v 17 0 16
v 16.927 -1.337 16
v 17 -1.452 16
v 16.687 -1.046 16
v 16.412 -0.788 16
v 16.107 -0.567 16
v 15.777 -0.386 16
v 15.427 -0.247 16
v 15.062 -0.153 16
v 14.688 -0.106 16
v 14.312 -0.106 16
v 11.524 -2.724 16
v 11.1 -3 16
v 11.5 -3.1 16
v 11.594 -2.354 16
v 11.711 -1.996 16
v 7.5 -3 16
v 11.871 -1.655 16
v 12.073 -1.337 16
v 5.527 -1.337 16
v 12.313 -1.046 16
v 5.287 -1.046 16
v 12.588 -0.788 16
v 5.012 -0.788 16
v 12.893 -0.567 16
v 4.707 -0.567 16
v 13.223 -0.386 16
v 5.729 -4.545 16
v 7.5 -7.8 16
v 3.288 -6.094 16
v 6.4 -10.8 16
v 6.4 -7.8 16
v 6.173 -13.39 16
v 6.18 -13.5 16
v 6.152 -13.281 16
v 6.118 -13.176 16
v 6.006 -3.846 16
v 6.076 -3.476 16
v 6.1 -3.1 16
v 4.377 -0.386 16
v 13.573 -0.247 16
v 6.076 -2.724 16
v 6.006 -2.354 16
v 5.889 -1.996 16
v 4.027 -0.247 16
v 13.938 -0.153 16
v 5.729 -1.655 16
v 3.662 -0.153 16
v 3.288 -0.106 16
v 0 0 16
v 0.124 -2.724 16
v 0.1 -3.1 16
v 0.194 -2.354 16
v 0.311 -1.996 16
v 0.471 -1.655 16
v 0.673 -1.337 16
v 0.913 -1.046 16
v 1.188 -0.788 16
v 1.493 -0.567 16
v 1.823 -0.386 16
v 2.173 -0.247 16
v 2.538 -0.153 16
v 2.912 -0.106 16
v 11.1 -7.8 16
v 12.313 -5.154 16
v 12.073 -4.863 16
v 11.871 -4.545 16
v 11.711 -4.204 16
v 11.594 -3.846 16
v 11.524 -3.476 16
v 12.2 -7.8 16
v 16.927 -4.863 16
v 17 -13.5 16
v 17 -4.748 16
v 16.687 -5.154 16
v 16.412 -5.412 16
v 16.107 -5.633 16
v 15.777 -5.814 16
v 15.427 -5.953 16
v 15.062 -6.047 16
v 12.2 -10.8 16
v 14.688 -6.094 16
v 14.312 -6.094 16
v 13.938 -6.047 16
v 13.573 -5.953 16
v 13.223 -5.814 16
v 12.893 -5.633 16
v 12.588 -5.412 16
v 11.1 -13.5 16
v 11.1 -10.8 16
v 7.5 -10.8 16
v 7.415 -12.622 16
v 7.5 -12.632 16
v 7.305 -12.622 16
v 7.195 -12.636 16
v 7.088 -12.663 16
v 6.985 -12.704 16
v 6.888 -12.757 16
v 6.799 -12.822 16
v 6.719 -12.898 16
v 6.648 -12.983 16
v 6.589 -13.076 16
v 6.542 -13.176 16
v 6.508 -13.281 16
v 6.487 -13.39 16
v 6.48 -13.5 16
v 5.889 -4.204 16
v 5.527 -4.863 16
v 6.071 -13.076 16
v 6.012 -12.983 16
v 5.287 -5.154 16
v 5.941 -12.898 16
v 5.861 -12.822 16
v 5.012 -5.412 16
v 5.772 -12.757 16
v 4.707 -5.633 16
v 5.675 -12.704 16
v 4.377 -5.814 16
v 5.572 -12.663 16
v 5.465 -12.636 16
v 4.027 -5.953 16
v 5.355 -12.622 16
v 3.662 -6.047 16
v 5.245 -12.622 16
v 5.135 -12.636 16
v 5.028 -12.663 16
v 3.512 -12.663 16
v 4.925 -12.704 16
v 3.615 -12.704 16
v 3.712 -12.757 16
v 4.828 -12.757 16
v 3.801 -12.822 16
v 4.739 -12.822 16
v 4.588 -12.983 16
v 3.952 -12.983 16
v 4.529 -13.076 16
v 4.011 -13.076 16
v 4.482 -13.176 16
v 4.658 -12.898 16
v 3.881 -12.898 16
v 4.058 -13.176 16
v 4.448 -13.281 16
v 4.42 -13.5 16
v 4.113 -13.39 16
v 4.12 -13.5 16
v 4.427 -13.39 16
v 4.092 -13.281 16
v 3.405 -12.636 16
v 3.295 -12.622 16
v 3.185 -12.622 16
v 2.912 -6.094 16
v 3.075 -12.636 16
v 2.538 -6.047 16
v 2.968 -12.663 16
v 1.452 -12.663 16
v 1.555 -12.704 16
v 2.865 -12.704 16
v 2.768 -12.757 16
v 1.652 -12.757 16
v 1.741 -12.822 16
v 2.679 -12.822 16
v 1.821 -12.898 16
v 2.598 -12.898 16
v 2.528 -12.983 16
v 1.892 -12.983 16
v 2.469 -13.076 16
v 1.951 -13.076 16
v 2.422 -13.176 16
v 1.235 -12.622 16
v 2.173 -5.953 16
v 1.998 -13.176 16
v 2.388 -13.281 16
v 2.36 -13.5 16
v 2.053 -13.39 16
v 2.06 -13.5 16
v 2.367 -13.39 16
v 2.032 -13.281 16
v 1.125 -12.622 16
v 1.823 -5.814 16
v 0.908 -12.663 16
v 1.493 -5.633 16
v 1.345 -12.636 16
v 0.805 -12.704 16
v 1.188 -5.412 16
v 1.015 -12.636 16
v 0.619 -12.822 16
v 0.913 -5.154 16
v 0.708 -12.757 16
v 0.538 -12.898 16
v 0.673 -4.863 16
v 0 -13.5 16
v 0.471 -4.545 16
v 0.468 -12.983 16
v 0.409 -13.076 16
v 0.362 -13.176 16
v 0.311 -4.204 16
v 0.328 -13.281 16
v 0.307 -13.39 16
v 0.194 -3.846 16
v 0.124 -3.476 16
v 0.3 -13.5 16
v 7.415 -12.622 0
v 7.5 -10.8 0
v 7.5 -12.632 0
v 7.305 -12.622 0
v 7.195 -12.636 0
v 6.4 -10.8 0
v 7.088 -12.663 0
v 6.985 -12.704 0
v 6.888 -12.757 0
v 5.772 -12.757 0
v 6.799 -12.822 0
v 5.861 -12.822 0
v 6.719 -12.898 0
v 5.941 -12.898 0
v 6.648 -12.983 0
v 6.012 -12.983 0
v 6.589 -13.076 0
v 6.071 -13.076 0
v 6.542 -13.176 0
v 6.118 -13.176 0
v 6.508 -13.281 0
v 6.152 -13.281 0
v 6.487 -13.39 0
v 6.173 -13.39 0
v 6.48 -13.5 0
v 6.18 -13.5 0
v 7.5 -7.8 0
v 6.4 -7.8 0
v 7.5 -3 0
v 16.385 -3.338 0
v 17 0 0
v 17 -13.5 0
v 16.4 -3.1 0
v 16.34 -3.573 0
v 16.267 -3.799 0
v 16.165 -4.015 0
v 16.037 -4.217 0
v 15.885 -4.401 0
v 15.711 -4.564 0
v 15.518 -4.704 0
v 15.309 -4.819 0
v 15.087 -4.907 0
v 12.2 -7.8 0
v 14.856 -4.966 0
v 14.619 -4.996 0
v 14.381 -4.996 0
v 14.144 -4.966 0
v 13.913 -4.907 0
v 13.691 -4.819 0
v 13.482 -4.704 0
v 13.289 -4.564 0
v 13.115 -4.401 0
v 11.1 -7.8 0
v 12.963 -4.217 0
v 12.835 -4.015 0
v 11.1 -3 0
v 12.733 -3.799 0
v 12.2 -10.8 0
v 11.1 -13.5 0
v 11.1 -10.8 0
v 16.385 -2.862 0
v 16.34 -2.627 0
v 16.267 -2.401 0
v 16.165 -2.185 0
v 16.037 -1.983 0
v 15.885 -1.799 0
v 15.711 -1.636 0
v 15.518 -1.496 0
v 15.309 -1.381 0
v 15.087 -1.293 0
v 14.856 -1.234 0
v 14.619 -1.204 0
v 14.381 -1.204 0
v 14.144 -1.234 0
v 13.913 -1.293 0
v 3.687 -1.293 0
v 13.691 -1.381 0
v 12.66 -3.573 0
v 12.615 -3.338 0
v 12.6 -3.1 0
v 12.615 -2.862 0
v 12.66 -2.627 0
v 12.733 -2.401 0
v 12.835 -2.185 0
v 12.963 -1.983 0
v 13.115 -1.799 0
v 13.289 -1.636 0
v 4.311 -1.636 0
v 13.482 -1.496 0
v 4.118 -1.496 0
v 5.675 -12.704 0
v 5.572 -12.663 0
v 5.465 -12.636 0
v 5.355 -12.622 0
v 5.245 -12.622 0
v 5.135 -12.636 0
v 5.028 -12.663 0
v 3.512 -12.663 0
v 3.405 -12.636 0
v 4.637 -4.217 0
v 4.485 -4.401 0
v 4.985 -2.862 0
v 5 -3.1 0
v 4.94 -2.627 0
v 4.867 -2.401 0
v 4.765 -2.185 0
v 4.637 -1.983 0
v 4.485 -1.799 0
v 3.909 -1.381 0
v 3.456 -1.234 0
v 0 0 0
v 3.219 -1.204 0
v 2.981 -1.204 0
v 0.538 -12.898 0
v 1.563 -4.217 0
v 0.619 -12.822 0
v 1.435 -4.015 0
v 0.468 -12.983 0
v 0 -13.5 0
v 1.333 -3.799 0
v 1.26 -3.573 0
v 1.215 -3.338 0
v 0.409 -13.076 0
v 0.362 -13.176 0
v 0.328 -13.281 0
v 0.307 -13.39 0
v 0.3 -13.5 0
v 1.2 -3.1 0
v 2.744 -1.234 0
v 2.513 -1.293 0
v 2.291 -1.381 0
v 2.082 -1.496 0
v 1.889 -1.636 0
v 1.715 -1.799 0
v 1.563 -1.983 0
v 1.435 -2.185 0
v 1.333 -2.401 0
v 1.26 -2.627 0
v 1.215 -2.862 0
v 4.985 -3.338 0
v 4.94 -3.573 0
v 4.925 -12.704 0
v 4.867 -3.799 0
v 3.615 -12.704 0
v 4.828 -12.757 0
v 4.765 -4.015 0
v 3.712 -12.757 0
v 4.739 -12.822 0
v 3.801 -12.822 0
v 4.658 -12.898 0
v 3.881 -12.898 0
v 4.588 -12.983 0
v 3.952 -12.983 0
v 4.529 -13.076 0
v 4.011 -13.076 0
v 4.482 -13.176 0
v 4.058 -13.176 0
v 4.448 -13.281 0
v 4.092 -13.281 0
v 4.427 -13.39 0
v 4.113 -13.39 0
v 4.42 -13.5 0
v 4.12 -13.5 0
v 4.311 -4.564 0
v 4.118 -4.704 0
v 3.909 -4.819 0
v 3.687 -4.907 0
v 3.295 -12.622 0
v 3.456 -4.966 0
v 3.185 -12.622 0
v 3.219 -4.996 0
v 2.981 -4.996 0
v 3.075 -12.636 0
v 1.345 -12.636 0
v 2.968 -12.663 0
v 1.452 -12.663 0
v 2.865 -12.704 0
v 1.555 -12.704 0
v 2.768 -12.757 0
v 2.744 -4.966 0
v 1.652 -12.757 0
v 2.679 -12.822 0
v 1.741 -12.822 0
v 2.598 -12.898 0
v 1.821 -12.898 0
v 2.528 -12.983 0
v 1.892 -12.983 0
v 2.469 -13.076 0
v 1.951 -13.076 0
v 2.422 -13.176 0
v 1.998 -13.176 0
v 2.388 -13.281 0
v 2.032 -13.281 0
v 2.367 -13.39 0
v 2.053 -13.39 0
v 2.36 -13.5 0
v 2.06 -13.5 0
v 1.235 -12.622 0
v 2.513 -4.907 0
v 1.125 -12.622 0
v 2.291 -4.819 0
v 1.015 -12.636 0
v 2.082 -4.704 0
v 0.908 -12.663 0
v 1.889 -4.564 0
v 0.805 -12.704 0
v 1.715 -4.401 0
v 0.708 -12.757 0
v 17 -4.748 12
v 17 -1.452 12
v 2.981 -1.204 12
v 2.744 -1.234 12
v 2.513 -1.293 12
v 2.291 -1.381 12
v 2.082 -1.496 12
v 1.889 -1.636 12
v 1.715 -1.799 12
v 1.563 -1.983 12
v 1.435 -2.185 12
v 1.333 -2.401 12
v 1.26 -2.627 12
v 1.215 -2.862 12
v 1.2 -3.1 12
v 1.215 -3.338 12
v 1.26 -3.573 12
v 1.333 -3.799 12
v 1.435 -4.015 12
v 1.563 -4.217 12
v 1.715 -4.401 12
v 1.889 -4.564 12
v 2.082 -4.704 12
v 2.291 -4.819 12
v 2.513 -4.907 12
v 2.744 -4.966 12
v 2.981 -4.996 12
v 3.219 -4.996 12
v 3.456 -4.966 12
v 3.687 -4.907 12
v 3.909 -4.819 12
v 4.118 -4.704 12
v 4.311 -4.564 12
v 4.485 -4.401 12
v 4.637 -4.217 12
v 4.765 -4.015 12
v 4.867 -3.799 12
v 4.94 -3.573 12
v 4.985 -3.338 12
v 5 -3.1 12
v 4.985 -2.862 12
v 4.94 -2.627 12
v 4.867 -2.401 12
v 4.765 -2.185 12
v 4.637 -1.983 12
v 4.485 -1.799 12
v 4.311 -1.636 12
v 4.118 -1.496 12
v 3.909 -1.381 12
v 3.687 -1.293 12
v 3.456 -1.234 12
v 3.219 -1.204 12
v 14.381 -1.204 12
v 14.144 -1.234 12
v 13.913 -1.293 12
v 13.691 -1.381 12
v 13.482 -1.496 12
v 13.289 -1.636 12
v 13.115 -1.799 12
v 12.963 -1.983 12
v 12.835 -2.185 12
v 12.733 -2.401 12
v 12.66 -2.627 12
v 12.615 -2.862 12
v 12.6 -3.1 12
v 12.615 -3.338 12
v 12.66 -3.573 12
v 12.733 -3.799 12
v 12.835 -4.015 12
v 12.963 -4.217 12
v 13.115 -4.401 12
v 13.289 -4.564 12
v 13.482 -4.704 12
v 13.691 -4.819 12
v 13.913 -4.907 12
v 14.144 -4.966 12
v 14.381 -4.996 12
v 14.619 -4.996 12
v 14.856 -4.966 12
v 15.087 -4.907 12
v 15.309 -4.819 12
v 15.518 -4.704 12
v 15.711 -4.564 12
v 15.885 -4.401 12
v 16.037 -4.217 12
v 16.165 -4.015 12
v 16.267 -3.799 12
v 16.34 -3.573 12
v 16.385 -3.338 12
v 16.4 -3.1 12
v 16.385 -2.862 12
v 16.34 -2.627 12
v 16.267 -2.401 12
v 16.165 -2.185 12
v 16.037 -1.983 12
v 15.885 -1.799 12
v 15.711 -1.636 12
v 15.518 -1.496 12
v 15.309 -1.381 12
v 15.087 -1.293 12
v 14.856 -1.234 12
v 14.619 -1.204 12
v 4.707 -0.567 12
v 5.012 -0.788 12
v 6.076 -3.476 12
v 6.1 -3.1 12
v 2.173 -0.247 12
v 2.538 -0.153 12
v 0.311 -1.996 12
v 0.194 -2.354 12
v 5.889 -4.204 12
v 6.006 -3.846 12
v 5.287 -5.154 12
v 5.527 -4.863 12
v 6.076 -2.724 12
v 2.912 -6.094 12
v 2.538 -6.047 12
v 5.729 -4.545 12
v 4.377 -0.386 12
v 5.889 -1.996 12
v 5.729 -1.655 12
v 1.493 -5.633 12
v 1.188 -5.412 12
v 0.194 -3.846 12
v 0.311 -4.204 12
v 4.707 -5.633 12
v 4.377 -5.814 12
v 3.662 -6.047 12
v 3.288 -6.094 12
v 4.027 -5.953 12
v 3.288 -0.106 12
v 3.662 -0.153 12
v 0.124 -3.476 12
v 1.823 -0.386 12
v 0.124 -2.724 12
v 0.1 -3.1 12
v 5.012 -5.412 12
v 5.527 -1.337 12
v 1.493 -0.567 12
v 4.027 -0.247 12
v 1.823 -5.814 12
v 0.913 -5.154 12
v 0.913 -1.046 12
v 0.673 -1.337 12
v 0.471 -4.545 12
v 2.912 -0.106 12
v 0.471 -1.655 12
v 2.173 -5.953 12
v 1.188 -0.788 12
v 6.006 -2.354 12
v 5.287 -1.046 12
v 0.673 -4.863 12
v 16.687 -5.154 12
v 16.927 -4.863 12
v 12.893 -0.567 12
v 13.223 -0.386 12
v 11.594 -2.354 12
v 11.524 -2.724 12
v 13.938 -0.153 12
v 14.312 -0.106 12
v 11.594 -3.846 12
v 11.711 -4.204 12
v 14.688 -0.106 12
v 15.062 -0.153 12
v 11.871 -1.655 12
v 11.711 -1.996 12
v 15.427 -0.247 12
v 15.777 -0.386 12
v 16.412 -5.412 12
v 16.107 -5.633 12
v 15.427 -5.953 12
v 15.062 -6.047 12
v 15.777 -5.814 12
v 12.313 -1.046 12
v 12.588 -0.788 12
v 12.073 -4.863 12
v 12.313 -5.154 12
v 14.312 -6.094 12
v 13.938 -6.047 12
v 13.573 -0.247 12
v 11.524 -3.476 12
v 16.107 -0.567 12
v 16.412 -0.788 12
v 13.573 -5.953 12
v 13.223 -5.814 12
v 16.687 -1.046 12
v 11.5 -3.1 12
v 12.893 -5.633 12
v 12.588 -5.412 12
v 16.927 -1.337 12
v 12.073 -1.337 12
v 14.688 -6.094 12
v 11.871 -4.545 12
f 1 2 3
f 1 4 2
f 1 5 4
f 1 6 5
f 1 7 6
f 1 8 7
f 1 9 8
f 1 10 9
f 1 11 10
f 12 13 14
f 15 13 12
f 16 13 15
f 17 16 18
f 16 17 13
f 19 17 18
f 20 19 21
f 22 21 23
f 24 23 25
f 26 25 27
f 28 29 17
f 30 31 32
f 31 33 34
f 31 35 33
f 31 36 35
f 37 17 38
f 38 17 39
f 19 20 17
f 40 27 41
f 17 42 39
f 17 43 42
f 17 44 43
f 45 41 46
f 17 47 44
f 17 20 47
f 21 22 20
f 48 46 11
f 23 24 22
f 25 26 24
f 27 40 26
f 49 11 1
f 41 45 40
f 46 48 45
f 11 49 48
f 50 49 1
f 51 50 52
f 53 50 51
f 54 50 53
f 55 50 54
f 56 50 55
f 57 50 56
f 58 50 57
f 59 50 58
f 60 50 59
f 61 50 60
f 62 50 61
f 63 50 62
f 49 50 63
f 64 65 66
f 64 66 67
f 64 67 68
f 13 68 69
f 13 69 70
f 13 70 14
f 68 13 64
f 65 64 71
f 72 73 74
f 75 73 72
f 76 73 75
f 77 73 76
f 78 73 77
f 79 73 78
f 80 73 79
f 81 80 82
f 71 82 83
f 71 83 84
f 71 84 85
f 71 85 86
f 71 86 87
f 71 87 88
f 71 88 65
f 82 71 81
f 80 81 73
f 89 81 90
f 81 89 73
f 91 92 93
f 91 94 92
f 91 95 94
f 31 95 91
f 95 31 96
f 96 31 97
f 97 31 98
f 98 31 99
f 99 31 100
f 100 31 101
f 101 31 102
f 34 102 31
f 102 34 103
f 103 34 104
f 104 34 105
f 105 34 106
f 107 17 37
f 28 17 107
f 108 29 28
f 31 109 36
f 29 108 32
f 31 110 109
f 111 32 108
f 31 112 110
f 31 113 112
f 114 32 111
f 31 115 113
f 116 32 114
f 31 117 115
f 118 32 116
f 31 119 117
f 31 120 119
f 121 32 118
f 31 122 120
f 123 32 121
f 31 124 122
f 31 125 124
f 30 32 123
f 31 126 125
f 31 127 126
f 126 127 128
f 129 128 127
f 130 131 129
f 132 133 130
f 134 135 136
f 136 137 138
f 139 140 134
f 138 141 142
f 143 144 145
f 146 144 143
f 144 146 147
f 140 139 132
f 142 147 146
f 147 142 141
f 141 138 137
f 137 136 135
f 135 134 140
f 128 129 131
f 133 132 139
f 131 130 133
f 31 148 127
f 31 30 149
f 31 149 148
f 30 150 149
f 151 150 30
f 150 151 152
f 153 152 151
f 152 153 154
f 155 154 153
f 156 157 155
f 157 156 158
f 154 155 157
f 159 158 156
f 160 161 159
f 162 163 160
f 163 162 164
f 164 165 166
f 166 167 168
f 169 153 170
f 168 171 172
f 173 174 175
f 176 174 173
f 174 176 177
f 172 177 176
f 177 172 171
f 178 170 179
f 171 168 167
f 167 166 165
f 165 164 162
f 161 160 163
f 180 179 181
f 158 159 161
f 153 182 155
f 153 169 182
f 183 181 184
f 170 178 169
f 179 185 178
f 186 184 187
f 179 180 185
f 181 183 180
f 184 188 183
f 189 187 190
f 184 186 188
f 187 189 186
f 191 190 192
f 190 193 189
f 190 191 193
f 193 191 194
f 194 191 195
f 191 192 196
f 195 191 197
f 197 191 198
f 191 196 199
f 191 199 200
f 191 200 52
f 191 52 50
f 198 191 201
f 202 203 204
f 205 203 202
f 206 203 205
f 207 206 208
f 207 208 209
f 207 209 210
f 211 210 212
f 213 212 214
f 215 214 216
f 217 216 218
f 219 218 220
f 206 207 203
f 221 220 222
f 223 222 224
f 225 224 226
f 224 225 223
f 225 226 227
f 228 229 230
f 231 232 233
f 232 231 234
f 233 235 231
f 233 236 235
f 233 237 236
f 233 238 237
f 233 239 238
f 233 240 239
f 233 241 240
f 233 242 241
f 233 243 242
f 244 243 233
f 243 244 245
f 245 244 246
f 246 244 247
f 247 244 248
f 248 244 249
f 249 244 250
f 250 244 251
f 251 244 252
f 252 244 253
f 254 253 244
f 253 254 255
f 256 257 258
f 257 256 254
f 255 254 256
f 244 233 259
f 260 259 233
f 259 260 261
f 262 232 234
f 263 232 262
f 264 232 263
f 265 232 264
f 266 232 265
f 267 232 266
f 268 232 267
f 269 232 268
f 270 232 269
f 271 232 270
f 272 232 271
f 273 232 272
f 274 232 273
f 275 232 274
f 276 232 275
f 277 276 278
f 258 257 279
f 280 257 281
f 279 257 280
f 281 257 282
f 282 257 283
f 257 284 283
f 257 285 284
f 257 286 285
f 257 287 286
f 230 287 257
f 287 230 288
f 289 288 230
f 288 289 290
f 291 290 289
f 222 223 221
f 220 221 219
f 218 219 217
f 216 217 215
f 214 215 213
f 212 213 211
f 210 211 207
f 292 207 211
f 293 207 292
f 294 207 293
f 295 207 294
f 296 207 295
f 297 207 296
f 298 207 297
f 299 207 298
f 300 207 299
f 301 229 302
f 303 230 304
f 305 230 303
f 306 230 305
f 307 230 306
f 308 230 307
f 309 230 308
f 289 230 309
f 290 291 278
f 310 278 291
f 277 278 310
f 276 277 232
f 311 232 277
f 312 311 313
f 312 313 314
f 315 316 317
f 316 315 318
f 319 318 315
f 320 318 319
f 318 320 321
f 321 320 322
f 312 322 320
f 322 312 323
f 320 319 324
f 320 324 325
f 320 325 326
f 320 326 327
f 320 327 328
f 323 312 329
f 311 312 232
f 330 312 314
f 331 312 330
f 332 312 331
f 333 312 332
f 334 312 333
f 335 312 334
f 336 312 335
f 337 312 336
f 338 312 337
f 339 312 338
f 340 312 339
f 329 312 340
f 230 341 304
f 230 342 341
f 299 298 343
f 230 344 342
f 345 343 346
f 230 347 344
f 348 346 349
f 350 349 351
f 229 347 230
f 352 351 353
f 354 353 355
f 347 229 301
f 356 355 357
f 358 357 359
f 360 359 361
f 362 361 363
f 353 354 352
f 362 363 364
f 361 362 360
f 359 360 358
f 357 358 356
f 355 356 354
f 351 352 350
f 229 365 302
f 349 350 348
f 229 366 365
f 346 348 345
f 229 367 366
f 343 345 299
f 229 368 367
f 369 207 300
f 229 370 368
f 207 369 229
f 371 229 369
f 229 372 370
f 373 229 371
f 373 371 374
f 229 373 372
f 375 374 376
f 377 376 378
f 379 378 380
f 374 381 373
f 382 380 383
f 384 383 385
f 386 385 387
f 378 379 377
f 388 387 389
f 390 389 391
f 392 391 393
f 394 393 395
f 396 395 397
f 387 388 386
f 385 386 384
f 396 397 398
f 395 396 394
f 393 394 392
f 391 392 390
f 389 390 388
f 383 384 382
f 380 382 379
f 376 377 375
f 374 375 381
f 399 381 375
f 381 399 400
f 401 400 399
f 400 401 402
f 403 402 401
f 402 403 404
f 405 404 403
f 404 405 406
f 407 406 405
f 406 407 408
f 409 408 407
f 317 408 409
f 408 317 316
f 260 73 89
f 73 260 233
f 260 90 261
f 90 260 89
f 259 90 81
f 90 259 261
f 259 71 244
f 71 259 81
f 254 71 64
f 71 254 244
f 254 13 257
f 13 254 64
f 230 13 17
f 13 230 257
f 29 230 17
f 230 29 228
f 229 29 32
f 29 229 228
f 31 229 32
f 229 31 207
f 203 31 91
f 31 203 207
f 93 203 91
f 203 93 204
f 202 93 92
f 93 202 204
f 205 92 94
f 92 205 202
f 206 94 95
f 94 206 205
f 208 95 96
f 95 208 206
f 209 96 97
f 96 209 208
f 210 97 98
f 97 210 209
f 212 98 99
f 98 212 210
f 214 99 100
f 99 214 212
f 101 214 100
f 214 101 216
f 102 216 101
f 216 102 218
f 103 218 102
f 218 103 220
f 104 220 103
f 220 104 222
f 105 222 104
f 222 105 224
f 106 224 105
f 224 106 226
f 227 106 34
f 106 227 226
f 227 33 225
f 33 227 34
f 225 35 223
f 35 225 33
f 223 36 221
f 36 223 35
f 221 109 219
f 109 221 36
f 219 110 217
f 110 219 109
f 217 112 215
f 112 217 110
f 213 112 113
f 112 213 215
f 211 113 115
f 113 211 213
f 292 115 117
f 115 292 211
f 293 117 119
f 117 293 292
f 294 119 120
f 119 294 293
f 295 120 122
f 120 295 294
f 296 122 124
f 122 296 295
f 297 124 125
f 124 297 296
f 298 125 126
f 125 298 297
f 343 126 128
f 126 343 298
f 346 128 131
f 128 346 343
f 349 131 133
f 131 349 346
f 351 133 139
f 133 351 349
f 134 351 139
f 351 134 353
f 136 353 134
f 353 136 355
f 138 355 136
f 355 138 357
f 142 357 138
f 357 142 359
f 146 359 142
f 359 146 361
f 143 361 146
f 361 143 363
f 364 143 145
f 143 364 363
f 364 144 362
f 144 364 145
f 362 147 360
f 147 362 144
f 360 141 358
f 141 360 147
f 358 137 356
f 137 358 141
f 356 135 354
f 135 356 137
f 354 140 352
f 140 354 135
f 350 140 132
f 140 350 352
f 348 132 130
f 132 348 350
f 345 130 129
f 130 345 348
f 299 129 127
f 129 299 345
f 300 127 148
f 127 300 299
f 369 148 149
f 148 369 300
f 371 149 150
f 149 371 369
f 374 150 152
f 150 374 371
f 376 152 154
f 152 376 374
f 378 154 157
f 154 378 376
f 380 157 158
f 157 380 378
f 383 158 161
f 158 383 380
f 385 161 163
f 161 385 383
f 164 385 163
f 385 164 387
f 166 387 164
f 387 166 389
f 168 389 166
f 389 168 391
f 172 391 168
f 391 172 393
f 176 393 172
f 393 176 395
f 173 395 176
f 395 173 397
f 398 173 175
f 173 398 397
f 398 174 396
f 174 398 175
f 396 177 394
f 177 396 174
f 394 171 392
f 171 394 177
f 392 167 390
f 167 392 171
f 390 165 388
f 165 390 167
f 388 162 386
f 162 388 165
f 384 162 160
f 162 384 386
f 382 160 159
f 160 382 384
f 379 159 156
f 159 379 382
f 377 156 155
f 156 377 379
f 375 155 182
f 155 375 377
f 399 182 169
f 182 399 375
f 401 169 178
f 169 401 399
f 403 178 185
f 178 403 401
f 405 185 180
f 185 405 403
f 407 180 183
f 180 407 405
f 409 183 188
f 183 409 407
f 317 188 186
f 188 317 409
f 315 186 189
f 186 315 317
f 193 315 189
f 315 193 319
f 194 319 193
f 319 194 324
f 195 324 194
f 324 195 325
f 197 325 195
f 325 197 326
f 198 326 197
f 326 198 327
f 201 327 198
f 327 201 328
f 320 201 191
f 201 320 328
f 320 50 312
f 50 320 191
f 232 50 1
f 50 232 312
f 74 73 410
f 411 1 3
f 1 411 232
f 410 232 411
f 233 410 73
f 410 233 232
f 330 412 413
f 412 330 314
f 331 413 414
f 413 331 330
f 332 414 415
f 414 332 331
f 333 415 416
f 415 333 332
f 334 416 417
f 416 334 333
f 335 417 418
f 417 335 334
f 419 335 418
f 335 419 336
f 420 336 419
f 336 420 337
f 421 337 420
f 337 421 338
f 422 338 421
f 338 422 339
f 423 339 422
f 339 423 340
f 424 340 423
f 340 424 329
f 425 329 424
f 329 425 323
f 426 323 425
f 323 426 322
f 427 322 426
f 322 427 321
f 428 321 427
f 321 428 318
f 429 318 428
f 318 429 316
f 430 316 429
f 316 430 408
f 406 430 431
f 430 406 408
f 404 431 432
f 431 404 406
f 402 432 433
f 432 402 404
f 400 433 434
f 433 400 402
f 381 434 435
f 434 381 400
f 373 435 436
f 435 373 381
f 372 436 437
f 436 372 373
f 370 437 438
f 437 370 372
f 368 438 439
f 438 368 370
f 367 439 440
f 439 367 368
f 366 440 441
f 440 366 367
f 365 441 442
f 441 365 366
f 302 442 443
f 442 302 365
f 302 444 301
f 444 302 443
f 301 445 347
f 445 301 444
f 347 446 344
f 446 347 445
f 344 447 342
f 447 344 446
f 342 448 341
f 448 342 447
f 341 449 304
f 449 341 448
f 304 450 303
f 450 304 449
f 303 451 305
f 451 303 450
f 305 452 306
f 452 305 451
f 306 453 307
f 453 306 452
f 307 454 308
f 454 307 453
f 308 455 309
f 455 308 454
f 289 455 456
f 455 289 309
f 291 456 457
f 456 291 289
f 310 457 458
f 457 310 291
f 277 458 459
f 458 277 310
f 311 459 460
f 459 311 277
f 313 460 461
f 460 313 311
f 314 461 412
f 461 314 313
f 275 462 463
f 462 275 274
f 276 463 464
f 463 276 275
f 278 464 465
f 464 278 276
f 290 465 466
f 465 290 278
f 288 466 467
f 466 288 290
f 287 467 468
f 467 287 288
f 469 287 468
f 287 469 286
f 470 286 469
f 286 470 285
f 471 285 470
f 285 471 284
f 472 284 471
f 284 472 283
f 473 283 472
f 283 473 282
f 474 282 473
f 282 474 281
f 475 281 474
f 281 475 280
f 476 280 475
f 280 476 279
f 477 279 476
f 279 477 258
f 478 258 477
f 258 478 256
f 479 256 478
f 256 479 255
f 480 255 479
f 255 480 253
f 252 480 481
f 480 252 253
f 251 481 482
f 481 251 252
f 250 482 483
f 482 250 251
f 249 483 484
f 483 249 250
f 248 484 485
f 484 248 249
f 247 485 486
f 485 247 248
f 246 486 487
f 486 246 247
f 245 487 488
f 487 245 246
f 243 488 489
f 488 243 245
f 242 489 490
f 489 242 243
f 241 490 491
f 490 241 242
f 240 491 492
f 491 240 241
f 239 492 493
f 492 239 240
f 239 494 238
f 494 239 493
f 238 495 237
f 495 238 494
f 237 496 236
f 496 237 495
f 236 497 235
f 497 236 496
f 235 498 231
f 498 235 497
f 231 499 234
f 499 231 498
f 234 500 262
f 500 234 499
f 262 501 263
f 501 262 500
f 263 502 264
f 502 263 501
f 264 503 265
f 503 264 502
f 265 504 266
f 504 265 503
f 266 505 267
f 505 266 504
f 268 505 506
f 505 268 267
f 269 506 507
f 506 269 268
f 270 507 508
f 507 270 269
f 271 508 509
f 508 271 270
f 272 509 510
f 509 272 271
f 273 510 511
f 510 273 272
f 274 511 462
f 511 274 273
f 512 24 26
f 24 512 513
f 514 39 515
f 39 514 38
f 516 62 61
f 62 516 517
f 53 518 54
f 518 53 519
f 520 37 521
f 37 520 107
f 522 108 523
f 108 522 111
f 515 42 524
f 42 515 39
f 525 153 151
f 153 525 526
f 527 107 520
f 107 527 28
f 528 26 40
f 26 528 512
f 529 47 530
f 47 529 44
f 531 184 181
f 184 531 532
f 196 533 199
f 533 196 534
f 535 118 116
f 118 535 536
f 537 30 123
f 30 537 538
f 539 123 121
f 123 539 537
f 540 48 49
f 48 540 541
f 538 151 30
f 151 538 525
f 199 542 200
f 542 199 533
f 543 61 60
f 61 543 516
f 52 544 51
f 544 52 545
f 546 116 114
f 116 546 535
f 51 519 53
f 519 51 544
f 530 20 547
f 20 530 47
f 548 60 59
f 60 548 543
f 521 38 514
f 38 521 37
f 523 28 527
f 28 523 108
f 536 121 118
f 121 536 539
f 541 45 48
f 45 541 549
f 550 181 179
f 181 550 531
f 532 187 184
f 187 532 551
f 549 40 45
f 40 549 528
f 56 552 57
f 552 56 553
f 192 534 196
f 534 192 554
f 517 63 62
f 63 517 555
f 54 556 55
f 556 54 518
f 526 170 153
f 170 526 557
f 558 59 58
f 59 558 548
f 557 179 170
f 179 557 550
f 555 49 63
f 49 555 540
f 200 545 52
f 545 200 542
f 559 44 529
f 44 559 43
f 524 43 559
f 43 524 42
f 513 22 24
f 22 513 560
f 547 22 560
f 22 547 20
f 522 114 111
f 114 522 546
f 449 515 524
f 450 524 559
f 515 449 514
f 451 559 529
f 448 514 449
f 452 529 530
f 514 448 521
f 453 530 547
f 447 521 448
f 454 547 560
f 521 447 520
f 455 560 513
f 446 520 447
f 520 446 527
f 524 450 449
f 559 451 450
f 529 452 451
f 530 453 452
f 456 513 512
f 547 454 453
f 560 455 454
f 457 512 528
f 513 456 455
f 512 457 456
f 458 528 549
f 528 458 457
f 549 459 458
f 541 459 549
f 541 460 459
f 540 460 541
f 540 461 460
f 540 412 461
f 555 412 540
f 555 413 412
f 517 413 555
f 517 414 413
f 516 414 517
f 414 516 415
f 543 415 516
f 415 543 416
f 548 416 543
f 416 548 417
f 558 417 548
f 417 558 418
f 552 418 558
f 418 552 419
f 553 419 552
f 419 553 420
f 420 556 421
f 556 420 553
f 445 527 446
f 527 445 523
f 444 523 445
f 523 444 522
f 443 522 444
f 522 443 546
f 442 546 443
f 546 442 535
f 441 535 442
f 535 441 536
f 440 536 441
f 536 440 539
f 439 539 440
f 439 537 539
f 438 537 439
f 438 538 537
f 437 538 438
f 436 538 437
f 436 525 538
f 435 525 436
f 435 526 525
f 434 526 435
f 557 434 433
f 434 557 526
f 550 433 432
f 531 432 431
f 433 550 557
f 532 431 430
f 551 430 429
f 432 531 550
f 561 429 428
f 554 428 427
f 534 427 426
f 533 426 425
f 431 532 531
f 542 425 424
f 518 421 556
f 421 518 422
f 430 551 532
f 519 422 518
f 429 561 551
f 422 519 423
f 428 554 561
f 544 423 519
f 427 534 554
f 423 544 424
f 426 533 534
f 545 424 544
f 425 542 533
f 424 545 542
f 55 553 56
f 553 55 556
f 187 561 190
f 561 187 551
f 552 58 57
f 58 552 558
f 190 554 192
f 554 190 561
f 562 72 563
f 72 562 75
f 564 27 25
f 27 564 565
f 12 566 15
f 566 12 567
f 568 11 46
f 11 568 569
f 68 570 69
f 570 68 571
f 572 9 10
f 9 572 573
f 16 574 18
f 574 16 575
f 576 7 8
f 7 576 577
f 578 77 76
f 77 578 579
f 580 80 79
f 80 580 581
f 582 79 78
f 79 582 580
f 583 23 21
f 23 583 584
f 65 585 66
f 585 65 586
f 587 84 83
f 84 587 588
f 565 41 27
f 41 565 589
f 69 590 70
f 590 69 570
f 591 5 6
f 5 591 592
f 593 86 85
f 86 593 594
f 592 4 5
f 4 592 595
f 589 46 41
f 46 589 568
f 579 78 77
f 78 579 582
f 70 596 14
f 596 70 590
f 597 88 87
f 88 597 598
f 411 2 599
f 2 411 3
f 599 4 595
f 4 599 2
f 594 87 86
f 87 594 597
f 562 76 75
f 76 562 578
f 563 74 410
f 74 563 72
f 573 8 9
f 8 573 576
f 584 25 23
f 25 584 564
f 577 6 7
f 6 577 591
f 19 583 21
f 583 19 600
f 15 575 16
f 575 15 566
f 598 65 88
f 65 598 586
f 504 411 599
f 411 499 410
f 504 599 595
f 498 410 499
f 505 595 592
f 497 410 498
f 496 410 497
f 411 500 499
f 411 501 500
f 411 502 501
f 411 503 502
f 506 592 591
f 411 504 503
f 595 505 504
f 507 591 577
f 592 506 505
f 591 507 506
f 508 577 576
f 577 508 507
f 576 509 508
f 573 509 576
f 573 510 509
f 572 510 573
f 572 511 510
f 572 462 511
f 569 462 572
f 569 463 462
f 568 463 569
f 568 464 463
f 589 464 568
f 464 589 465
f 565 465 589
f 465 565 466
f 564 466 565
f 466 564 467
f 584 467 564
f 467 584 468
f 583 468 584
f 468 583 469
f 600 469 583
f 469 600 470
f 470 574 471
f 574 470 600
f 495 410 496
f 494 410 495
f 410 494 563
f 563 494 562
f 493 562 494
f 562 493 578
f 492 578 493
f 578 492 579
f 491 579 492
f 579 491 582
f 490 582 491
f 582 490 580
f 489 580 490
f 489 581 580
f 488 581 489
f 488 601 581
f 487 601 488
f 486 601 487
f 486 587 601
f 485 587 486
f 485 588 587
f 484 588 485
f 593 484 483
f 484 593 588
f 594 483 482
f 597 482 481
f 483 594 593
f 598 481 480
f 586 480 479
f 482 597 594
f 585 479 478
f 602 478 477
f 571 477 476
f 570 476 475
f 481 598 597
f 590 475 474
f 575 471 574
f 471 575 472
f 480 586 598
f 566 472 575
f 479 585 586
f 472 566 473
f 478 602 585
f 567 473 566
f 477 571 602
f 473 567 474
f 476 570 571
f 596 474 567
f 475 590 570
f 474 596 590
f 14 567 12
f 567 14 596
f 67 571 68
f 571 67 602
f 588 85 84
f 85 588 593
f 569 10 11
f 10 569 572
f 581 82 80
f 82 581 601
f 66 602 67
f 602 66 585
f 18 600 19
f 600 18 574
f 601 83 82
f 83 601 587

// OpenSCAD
// A replacement part for Anet Prusa i3 belt holder

POINT_SIZE = 0.88;
HOLE_RADIUS = 1.9;
HEIGHT = 16;

module first() {
    linear_extrude(HEIGHT){   
        difference() {
            square([17, 13.5]);
            translate([3.1, 3.1]) circle(HOLE_RADIUS, $fn=50);
            translate([14.5, 3.1]) circle(HOLE_RADIUS, $fn=50);
            translate([7.5, 3]) square([3.6, 11]);
            translate([6.4, 7.8]) square([5.8, 3.0]);
            translate([0.3+POINT_SIZE, 13.5]) circle(POINT_SIZE, $fn=50);
            translate([0.3*2+POINT_SIZE*3, 13.5]) circle(POINT_SIZE, $fn=50);
            translate([0.3*3+POINT_SIZE*5, 13.5]) circle(POINT_SIZE, $fn=50);
            translate([0.3*4+POINT_SIZE*7, 13.5]) circle(POINT_SIZE, $fn=50);
        }
    }
}

translate([0, 0, HEIGHT]) rotate([180, 0, 0]) {
    
    difference() {
        first();
        translate([3.1, 3.1, -1]) cylinder(5, 3, 3, $fn=50);
        translate([14.5, 3.1, -1]) cylinder(5, 3, 3, $fn=50);
    }
}
